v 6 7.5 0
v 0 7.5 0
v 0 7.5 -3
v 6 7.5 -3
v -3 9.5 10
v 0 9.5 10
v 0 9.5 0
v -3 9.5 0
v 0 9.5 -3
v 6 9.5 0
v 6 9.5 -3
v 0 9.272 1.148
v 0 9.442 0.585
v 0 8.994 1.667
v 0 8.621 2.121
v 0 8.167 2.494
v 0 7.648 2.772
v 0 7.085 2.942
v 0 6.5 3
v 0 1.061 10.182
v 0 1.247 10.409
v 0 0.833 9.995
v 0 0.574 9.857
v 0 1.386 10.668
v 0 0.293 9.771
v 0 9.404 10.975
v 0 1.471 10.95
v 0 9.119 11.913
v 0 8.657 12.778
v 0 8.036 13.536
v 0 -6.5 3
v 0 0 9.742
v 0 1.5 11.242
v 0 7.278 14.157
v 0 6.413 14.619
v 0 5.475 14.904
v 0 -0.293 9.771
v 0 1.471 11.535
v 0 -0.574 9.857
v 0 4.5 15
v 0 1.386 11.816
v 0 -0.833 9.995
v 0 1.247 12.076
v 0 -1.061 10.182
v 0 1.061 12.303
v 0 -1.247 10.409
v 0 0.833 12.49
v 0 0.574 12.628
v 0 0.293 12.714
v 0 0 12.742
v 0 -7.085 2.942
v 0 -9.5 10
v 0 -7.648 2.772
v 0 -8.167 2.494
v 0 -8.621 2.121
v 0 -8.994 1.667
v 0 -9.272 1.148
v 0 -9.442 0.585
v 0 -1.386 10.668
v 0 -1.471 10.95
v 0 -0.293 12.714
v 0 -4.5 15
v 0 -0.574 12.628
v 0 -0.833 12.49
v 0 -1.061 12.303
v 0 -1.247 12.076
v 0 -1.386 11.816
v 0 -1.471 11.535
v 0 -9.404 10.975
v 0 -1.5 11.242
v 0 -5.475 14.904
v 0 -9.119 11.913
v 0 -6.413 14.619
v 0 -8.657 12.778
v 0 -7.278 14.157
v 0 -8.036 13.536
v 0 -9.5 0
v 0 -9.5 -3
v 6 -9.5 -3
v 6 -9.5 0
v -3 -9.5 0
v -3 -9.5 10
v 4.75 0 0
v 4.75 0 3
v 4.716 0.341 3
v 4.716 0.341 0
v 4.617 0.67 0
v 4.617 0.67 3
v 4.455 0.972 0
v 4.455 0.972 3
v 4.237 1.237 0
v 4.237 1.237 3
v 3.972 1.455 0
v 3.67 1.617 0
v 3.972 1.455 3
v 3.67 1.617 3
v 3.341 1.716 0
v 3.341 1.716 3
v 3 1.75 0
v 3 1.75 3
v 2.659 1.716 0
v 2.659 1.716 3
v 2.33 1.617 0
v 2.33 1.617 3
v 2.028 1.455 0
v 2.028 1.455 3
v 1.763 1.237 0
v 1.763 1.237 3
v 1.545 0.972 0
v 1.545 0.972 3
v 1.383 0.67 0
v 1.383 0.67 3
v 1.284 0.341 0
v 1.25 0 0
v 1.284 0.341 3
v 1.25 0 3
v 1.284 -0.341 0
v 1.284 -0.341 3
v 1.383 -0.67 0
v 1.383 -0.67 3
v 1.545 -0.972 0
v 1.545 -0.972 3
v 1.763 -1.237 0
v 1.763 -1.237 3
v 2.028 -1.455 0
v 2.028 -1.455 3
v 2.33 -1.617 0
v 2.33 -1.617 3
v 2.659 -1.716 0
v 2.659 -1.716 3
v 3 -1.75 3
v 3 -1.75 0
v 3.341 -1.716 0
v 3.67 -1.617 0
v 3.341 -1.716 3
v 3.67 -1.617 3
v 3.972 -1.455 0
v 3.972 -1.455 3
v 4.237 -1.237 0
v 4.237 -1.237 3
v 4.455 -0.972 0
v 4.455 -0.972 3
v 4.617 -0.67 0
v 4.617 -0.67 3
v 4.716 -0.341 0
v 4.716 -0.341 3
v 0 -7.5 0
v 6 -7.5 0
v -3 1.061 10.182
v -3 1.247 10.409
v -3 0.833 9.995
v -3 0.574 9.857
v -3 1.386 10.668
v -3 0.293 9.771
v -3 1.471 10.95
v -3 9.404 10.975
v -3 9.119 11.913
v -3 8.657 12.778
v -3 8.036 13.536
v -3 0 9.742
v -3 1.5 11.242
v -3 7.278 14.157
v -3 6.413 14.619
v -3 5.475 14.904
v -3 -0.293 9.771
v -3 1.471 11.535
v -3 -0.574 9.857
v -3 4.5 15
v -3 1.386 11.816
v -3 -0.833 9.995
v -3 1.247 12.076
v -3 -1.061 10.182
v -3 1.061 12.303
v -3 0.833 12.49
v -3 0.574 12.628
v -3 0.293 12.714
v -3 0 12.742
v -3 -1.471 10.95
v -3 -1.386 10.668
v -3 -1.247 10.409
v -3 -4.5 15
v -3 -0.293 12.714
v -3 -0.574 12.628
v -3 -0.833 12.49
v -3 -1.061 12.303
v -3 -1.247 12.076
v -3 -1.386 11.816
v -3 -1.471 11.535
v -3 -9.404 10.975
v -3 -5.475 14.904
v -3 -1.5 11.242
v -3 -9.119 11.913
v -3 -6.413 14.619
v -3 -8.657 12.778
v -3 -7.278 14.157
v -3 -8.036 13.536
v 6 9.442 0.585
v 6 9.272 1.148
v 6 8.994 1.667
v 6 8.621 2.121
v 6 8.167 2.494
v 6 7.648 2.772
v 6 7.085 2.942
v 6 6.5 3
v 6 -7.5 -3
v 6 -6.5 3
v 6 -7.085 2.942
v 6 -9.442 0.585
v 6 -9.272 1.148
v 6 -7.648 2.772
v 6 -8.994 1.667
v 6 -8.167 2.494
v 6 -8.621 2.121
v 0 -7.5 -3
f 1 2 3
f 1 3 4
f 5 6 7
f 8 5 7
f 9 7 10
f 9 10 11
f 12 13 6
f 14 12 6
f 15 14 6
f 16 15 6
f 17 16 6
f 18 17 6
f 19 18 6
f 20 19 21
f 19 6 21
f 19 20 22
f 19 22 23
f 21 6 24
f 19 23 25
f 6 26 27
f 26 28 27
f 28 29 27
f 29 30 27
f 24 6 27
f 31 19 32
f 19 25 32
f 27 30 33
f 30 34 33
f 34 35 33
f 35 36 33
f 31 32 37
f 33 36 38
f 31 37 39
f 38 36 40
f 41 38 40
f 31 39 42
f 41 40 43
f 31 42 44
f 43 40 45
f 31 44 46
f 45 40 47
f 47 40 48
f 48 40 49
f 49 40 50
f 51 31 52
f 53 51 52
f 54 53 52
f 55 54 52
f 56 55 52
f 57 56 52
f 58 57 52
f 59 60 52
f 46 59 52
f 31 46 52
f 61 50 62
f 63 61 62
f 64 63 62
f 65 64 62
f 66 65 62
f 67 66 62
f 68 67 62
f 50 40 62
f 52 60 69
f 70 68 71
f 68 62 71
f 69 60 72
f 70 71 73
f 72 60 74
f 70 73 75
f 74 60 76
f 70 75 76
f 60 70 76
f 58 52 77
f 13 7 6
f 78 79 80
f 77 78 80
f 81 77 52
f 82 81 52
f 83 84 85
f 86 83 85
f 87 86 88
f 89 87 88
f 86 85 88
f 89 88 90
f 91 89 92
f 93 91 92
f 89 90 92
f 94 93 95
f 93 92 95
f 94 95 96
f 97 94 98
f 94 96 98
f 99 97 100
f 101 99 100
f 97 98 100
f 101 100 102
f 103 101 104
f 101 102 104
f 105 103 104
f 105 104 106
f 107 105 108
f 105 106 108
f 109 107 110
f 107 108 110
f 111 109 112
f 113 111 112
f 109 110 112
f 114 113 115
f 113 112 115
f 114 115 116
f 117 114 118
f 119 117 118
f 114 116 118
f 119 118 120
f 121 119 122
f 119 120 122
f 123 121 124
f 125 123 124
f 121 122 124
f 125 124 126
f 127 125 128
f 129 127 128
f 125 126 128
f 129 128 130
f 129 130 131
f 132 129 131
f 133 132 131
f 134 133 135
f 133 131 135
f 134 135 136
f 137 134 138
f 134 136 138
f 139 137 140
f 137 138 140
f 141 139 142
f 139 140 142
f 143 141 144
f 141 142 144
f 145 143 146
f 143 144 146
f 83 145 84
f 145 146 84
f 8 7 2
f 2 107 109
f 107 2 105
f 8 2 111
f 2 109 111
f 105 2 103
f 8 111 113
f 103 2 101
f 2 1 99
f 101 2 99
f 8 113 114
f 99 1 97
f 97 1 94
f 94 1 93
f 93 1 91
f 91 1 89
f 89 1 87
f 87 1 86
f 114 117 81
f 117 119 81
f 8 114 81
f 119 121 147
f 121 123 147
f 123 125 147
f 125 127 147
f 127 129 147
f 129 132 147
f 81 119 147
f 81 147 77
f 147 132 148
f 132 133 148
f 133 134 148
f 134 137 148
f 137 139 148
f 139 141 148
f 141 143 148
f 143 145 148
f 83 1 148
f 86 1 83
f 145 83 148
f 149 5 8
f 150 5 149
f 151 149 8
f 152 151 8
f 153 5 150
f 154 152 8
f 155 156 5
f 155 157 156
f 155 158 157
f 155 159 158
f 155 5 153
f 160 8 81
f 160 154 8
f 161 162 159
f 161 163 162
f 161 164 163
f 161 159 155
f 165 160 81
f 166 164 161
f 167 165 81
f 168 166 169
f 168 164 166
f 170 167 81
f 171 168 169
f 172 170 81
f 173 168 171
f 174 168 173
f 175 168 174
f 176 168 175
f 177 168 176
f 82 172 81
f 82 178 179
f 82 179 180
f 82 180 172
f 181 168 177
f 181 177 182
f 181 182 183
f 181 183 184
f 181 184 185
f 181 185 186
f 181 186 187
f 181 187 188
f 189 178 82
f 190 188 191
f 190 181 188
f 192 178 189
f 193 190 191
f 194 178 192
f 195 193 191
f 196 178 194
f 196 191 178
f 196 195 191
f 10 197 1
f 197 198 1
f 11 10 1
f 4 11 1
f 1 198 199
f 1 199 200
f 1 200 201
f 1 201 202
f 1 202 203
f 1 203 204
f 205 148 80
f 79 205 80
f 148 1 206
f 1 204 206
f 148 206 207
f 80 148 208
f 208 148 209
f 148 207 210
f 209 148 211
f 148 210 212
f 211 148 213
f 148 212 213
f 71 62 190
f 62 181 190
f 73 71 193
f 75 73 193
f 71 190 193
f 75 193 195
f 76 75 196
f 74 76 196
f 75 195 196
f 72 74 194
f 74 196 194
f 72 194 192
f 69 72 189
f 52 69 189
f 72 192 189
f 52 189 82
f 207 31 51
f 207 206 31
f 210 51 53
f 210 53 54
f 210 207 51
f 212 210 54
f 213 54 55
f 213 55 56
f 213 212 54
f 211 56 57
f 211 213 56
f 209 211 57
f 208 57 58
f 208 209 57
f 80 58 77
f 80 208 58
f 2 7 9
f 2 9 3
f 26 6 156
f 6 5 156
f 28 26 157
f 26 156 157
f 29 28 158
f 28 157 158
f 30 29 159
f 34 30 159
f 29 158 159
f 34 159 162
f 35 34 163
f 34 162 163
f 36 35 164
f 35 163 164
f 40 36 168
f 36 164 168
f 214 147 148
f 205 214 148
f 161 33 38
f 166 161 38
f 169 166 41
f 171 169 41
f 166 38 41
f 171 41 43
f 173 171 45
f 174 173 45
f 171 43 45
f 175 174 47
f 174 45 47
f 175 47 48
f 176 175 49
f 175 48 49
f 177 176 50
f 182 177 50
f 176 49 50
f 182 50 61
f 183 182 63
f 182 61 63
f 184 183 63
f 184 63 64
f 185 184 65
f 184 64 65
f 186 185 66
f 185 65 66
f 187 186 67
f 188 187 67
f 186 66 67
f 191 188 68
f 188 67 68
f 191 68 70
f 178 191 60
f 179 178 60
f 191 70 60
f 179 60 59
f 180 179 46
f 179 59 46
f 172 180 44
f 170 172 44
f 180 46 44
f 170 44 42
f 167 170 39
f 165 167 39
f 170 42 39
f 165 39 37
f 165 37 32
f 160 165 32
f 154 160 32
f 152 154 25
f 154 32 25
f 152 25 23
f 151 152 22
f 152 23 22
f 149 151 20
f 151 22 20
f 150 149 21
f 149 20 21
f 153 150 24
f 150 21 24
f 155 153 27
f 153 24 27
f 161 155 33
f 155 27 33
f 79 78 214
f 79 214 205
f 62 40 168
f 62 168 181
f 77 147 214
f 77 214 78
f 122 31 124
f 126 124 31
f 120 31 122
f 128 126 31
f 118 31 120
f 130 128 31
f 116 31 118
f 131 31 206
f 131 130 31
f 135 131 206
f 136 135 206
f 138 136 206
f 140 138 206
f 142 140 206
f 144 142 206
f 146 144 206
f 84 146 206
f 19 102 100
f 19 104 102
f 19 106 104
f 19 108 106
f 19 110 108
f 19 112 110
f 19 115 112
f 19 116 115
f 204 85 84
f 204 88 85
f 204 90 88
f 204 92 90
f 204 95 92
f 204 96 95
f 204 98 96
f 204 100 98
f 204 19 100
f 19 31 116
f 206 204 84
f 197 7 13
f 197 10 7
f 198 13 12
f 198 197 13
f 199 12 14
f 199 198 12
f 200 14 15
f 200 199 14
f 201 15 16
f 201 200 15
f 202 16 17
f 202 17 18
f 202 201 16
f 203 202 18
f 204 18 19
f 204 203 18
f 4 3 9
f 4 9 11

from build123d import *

# Parameters (mm, degrees)
F0_W     = 6
F0_H     = 19
F1_DEPTH = 3
F2_W     = 6
F2_H     = 2
F3_DEPTH = 3
F4_R     = 1.75
F5_DEPTH = 3
F6_W     = 19
F6_H     = 12
F7_DEPTH = 3
F8_R     = 1.5
F9_DEPTH = 3
F10_R    = 5
F11_R    = 3


with BuildPart() as f1:
    # F0 (on Top) → F1 (new body)
    with BuildSketch(Plane.XY):
        with Locations((3, 0)):
            Rectangle(F0_W, F0_H)
    extrude(amount=F1_DEPTH)

    # F2 (on face) → F3 (join)
    with BuildSketch(Plane(origin=(0, 0, 0), x_dir=(1, 0, 0), z_dir=(0, 0, -1))):
        with Locations((3, 8.5)):
            Rectangle(F2_W, F2_H)
        with Locations((3, -8.5)):
            Rectangle(F2_W, F2_H)
    extrude(amount=F3_DEPTH)

    # F4 (on face) → F5 (cut)
    with BuildSketch(Plane.XY.offset(3)):
        with Locations((3, 0)):
            Circle(F4_R)
    extrude(amount=-F5_DEPTH, mode=Mode.SUBTRACT)

    # F6 (on face) → F7 (join)
    with BuildSketch(Plane(origin=(0, 0, 0), x_dir=(0, -1, 0), z_dir=(-1, 0, 0))):
        with Locations((0, 9)):
            Rectangle(F6_W, F6_H)
        Polygon((-9.5, 3), (-9.5, 0), (-7.5, 0), (7.5, 0), (9.5, 0), (9.5, 3), align=None)
    extrude(amount=F7_DEPTH)

    # F8 (on face) → F9 (cut)
    with BuildSketch(Plane.YZ):
        with Locations((0, 11.2423589453)):
            Circle(F8_R)
    extrude(amount=-F9_DEPTH, mode=Mode.SUBTRACT)

    # F10
    f10_edges = [f1.edges().sort_by_distance(p)[0] for p in [
        (-1.5, -9.5, 15),
        (-1.5, 9.5, 15),
    ]]
    fillet(f10_edges, radius=F10_R)

    # F11
    f11_edges = [f1.edges().sort_by_distance(p)[0] for p in [
        (3, -9.5, 3),
        (3, 9.5, 3),
    ]]
    fillet(f11_edges, radius=F11_R)


solid = f1.part
